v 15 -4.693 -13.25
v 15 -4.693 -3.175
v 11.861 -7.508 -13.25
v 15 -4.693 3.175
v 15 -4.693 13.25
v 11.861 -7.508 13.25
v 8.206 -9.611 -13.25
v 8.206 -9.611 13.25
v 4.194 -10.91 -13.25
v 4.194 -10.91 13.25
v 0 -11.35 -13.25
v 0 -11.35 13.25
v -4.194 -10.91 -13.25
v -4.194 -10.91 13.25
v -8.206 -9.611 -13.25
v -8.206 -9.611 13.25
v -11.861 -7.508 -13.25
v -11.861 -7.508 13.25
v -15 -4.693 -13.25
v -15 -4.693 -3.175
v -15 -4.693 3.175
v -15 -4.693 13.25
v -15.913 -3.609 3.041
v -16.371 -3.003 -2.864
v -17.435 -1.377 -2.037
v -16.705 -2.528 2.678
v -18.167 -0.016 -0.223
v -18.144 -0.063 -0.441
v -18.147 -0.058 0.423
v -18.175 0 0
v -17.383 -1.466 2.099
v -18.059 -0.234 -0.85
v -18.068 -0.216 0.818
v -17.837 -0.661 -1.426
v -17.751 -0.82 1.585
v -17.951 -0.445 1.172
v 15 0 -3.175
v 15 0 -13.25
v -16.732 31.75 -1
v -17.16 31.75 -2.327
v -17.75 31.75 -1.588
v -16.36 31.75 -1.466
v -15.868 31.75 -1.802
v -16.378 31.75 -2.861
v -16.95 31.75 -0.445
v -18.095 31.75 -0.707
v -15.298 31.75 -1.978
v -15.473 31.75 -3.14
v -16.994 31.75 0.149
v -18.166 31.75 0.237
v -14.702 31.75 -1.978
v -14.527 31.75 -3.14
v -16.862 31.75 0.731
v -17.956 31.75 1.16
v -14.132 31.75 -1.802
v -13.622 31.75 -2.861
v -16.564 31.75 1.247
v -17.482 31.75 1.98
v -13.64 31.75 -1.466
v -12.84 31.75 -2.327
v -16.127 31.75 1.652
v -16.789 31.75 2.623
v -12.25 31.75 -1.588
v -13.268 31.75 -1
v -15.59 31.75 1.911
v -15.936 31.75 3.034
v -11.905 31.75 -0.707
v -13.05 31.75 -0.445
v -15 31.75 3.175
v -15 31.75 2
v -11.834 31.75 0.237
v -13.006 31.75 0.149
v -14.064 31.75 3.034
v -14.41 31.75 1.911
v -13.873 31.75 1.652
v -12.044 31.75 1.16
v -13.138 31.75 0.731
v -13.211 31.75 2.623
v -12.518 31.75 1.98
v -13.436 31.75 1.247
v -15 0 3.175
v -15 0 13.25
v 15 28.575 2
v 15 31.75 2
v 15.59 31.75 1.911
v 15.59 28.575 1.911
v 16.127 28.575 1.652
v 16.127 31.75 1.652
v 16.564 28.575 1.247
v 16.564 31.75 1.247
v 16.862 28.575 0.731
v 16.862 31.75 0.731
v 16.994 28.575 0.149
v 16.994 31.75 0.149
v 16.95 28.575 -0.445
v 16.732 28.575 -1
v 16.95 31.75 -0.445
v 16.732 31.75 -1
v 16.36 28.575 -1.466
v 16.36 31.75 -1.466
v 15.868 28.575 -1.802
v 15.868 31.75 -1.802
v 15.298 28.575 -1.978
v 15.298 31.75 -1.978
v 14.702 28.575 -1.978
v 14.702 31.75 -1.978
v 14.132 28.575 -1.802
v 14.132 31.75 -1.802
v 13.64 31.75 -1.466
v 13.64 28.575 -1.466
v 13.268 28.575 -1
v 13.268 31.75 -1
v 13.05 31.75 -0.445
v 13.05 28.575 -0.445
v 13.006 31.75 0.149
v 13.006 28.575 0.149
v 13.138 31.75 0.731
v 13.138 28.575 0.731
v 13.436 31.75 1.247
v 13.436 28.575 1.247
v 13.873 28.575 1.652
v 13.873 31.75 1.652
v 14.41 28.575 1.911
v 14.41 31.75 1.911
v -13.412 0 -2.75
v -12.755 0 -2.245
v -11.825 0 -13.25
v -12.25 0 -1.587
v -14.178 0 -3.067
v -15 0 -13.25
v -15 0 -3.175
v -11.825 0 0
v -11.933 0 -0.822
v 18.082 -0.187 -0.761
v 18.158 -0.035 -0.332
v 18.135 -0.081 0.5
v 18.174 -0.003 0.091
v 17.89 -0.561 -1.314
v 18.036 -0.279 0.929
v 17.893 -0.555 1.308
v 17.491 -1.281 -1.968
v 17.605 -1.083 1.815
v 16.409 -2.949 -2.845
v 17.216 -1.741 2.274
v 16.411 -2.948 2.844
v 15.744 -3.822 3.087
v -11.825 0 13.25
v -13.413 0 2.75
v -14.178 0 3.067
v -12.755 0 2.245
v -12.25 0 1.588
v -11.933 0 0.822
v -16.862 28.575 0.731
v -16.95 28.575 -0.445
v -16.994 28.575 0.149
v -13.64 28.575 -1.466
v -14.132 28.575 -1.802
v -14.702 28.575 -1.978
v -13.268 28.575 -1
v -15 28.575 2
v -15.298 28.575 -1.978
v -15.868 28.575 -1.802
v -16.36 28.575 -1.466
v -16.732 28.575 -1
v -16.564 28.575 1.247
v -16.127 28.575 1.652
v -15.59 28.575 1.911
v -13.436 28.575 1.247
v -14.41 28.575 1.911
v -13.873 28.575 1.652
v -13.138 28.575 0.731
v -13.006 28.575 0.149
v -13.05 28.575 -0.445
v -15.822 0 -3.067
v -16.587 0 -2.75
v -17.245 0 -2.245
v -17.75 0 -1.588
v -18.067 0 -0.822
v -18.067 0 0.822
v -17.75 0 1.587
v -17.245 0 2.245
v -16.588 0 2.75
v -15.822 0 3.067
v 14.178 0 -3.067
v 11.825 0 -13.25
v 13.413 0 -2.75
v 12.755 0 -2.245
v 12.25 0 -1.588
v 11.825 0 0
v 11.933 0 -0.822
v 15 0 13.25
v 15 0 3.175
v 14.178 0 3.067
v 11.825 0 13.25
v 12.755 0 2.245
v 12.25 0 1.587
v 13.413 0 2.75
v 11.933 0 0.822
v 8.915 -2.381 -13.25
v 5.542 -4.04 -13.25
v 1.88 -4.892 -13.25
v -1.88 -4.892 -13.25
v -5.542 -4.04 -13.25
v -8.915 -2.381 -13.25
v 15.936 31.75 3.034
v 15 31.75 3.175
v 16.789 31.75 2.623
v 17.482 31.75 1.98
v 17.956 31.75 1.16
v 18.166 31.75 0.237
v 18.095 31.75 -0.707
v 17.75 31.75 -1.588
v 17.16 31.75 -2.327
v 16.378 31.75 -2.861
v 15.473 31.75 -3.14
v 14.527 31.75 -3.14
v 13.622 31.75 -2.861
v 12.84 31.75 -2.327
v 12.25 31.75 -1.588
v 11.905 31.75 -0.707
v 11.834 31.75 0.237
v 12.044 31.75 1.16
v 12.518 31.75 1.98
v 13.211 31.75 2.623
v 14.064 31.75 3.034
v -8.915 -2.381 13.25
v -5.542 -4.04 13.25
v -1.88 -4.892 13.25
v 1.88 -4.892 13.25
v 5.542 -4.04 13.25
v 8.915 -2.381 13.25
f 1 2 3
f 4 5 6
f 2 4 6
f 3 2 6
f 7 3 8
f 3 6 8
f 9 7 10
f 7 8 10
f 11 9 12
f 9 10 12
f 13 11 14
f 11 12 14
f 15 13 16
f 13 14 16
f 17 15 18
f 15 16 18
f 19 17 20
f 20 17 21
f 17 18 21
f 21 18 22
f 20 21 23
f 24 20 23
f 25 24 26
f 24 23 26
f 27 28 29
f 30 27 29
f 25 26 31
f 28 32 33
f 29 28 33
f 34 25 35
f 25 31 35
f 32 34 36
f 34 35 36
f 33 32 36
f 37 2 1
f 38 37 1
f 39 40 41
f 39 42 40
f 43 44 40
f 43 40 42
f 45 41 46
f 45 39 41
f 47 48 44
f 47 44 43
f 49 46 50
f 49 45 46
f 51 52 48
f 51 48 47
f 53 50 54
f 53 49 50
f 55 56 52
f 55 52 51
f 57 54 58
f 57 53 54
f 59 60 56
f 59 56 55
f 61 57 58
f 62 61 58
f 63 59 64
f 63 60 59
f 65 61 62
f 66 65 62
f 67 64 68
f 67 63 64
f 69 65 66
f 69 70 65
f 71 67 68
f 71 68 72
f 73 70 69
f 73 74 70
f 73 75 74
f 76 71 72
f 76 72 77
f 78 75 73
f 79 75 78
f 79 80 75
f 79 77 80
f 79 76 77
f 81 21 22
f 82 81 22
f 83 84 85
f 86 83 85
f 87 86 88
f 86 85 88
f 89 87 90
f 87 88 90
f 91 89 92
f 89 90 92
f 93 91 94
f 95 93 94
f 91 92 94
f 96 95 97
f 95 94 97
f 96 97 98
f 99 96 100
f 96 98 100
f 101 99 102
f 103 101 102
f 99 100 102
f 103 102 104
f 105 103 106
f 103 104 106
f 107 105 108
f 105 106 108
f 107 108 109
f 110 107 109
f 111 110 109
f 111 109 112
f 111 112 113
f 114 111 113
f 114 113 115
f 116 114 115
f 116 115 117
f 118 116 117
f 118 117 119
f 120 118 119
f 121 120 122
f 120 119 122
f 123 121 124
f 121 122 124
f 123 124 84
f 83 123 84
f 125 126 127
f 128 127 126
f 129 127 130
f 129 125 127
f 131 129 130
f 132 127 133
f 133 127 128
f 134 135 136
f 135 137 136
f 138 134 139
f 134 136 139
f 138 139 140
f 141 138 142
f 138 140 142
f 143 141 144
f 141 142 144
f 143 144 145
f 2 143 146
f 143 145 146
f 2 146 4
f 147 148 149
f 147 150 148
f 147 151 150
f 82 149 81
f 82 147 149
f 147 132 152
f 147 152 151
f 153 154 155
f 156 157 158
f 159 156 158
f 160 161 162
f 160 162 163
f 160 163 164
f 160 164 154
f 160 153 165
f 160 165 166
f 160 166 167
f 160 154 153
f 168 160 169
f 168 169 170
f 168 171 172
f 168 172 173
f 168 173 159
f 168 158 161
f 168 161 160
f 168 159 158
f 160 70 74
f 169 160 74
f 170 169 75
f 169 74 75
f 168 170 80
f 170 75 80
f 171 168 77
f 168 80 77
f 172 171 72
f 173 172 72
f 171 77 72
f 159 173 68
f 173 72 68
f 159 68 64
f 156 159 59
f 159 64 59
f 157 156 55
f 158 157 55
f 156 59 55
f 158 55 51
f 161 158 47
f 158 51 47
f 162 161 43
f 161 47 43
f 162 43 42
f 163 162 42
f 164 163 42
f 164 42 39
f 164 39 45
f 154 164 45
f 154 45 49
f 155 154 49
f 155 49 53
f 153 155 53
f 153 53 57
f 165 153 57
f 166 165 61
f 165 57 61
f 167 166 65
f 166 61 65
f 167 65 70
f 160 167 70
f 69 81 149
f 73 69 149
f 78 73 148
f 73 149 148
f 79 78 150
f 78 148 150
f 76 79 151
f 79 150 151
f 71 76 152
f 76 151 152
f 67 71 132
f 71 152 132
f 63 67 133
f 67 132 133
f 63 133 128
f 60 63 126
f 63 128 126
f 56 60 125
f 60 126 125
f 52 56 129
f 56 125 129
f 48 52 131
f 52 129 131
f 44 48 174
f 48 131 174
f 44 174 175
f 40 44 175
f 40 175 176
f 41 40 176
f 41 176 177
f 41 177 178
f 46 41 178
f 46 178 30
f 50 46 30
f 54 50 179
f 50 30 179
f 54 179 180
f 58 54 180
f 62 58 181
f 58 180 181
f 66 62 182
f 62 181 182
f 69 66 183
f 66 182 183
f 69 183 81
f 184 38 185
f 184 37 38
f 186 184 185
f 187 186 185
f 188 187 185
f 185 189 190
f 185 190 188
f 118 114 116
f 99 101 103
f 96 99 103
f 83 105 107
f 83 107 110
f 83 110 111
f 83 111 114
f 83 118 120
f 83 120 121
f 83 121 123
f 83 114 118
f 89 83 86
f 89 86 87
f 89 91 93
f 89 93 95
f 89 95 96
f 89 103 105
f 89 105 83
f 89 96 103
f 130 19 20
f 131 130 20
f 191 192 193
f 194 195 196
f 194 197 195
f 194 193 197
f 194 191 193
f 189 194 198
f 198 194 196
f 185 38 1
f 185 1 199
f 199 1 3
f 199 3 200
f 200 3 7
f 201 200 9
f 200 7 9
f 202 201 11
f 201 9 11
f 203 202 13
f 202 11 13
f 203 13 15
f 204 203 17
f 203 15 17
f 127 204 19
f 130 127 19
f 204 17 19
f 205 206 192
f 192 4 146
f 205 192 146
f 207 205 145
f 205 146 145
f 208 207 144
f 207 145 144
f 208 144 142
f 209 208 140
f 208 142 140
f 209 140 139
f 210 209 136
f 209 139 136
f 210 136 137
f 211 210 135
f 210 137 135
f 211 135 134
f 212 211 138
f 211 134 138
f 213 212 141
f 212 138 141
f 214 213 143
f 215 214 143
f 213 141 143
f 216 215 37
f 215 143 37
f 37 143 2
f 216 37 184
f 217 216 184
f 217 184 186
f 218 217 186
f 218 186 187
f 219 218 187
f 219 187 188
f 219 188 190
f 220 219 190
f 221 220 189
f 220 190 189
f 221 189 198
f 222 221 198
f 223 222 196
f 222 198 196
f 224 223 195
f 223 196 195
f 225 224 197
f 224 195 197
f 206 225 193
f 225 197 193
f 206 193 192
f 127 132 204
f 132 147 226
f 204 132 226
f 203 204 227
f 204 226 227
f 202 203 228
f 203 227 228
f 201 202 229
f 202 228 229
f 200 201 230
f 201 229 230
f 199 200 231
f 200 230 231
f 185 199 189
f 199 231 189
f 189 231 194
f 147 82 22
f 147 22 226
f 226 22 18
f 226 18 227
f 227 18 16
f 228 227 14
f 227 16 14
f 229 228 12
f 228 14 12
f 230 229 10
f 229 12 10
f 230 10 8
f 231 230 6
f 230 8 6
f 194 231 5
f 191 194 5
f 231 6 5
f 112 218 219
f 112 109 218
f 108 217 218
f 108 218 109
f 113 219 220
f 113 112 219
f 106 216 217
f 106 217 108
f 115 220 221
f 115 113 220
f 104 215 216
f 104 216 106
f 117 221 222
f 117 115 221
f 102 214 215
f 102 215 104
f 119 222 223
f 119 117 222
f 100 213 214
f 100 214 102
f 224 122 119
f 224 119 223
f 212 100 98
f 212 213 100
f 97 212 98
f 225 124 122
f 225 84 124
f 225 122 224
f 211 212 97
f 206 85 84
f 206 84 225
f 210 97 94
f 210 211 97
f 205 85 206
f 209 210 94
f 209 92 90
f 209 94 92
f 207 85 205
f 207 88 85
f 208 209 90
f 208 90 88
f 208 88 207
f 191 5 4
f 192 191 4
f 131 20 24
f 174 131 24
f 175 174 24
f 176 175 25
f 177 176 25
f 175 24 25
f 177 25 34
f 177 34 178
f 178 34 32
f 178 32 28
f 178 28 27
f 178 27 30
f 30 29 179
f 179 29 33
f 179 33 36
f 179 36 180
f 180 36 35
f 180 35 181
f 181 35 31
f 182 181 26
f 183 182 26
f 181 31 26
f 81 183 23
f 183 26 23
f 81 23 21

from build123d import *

# Parameters (mm, degrees)
SKETCH1_R             = 3.175
BOSS_EXTRUDE1_DEPTH   = 31.75
BOSS_EXTRUDE1_2_DEPTH = 31.75
BOSS_EXTRUDE2_START   = 20
BOSS_EXTRUDE2_DEPTH   = 20
CUT_EXTRUDE2_DEPTH    = 46.173478115
SKETCH4_R             = 2
CUT_EXTRUDE3_DEPTH    = 3.175


with BuildPart() as part:
    # Sketch1 → Boss-Extrude1 (new body)
    with BuildSketch(Plane(origin=(0, 0, 0), x_dir=(1, 0, 0), z_dir=(0, 1, 0))):
        with Locations(Location((-15, 0, 0), (0, 0, 270))):
            Circle(SKETCH1_R)
    extrude(amount=BOSS_EXTRUDE1_DEPTH)



with BuildPart() as body_2:
    # Sketch1 → Boss-Extrude1 2 (new body)
    with BuildSketch(Plane(origin=(0, 0, 0), x_dir=(1, 0, 0), z_dir=(0, 1, 0))):
        with Locations(Location((15, 0, 0), (0, 0, 270))):
            Circle(SKETCH1_R)
    extrude(amount=BOSS_EXTRUDE1_2_DEPTH)


with BuildPart() as part_1:
    add(part.part)

    add(body_2.part)  # Boss-Extrude2 merges body 2
    # Sketch2 → Boss-Extrude2 (add)
    with BuildSketch(Plane.XZ.offset(BOSS_EXTRUDE2_START)):
        with BuildLine():
            Line((-15, 3.175), (-15, 13.25))
            Line((-15, 13.25), (15, 13.25))
            Line((15, 13.25), (15, 3.175))
            ThreePointArc((15, 3.175), (18.175, 0), (15, -3.175))
            Line((15, -3.175), (15, -13.25))
            Line((15, -13.25), (-15, -13.25))
            Line((-15, -13.25), (-15, -3.175))
            ThreePointArc((-15, -3.175), (-18.175, 0), (-15, 3.175))
        make_face()
    extrude(amount=-BOSS_EXTRUDE2_DEPTH)

    # Sketch5 → Cut-Extrude2 (cut, through all)
    with BuildSketch(Plane.XY.offset(13.25)):
        with BuildLine():
            ThreePointArc((15, -4.692512186), (0, -11.35), (-15, -4.692512186))
            Line((-15, -4.692512186), (-15, -20))
            Line((-15, -20), (15, -20))
            Line((15, -20), (15, -4.692512186))
        make_face()
        with BuildLine():
            ThreePointArc((-15, -4.692512186), (-16.752613942, -2.457973814), (-18.175, 0))
            Line((-18.175, 0), (-18.175, -20))
            Line((-18.175, -20), (-15, -20))
            Line((-15, -20), (-15, -4.692512186))
        make_face()
        with BuildLine():
            ThreePointArc((18.175, 0), (16.752613942, -2.457973814), (15, -4.692512186))
            Line((15, -4.692512186), (15, -20))
            Line((15, -20), (18.175, -20))
            Line((18.175, -20), (18.175, 0))
        make_face()
        with BuildLine():
            ThreePointArc((-11.825, 0), (0, -5), (11.825, 0))
            Line((11.825, 0), (-11.825, 0))
        make_face()
    extrude(amount=-CUT_EXTRUDE2_DEPTH, mode=Mode.SUBTRACT)

    # Sketch4 → Cut-Extrude3 (cut)
    with BuildSketch(Plane(origin=(0, 31.75, 0), x_dir=(1, 0, 0), z_dir=(0, 1, 0))):
        with Locations(Location((-15, 0, 0), (0, 0, 270))):
            Circle(SKETCH4_R)
        with Locations(Location((15, 0, 0), (0, 0, 270))):
            Circle(SKETCH4_R)
    extrude(amount=-CUT_EXTRUDE3_DEPTH, mode=Mode.SUBTRACT)


solid = part_1.part
